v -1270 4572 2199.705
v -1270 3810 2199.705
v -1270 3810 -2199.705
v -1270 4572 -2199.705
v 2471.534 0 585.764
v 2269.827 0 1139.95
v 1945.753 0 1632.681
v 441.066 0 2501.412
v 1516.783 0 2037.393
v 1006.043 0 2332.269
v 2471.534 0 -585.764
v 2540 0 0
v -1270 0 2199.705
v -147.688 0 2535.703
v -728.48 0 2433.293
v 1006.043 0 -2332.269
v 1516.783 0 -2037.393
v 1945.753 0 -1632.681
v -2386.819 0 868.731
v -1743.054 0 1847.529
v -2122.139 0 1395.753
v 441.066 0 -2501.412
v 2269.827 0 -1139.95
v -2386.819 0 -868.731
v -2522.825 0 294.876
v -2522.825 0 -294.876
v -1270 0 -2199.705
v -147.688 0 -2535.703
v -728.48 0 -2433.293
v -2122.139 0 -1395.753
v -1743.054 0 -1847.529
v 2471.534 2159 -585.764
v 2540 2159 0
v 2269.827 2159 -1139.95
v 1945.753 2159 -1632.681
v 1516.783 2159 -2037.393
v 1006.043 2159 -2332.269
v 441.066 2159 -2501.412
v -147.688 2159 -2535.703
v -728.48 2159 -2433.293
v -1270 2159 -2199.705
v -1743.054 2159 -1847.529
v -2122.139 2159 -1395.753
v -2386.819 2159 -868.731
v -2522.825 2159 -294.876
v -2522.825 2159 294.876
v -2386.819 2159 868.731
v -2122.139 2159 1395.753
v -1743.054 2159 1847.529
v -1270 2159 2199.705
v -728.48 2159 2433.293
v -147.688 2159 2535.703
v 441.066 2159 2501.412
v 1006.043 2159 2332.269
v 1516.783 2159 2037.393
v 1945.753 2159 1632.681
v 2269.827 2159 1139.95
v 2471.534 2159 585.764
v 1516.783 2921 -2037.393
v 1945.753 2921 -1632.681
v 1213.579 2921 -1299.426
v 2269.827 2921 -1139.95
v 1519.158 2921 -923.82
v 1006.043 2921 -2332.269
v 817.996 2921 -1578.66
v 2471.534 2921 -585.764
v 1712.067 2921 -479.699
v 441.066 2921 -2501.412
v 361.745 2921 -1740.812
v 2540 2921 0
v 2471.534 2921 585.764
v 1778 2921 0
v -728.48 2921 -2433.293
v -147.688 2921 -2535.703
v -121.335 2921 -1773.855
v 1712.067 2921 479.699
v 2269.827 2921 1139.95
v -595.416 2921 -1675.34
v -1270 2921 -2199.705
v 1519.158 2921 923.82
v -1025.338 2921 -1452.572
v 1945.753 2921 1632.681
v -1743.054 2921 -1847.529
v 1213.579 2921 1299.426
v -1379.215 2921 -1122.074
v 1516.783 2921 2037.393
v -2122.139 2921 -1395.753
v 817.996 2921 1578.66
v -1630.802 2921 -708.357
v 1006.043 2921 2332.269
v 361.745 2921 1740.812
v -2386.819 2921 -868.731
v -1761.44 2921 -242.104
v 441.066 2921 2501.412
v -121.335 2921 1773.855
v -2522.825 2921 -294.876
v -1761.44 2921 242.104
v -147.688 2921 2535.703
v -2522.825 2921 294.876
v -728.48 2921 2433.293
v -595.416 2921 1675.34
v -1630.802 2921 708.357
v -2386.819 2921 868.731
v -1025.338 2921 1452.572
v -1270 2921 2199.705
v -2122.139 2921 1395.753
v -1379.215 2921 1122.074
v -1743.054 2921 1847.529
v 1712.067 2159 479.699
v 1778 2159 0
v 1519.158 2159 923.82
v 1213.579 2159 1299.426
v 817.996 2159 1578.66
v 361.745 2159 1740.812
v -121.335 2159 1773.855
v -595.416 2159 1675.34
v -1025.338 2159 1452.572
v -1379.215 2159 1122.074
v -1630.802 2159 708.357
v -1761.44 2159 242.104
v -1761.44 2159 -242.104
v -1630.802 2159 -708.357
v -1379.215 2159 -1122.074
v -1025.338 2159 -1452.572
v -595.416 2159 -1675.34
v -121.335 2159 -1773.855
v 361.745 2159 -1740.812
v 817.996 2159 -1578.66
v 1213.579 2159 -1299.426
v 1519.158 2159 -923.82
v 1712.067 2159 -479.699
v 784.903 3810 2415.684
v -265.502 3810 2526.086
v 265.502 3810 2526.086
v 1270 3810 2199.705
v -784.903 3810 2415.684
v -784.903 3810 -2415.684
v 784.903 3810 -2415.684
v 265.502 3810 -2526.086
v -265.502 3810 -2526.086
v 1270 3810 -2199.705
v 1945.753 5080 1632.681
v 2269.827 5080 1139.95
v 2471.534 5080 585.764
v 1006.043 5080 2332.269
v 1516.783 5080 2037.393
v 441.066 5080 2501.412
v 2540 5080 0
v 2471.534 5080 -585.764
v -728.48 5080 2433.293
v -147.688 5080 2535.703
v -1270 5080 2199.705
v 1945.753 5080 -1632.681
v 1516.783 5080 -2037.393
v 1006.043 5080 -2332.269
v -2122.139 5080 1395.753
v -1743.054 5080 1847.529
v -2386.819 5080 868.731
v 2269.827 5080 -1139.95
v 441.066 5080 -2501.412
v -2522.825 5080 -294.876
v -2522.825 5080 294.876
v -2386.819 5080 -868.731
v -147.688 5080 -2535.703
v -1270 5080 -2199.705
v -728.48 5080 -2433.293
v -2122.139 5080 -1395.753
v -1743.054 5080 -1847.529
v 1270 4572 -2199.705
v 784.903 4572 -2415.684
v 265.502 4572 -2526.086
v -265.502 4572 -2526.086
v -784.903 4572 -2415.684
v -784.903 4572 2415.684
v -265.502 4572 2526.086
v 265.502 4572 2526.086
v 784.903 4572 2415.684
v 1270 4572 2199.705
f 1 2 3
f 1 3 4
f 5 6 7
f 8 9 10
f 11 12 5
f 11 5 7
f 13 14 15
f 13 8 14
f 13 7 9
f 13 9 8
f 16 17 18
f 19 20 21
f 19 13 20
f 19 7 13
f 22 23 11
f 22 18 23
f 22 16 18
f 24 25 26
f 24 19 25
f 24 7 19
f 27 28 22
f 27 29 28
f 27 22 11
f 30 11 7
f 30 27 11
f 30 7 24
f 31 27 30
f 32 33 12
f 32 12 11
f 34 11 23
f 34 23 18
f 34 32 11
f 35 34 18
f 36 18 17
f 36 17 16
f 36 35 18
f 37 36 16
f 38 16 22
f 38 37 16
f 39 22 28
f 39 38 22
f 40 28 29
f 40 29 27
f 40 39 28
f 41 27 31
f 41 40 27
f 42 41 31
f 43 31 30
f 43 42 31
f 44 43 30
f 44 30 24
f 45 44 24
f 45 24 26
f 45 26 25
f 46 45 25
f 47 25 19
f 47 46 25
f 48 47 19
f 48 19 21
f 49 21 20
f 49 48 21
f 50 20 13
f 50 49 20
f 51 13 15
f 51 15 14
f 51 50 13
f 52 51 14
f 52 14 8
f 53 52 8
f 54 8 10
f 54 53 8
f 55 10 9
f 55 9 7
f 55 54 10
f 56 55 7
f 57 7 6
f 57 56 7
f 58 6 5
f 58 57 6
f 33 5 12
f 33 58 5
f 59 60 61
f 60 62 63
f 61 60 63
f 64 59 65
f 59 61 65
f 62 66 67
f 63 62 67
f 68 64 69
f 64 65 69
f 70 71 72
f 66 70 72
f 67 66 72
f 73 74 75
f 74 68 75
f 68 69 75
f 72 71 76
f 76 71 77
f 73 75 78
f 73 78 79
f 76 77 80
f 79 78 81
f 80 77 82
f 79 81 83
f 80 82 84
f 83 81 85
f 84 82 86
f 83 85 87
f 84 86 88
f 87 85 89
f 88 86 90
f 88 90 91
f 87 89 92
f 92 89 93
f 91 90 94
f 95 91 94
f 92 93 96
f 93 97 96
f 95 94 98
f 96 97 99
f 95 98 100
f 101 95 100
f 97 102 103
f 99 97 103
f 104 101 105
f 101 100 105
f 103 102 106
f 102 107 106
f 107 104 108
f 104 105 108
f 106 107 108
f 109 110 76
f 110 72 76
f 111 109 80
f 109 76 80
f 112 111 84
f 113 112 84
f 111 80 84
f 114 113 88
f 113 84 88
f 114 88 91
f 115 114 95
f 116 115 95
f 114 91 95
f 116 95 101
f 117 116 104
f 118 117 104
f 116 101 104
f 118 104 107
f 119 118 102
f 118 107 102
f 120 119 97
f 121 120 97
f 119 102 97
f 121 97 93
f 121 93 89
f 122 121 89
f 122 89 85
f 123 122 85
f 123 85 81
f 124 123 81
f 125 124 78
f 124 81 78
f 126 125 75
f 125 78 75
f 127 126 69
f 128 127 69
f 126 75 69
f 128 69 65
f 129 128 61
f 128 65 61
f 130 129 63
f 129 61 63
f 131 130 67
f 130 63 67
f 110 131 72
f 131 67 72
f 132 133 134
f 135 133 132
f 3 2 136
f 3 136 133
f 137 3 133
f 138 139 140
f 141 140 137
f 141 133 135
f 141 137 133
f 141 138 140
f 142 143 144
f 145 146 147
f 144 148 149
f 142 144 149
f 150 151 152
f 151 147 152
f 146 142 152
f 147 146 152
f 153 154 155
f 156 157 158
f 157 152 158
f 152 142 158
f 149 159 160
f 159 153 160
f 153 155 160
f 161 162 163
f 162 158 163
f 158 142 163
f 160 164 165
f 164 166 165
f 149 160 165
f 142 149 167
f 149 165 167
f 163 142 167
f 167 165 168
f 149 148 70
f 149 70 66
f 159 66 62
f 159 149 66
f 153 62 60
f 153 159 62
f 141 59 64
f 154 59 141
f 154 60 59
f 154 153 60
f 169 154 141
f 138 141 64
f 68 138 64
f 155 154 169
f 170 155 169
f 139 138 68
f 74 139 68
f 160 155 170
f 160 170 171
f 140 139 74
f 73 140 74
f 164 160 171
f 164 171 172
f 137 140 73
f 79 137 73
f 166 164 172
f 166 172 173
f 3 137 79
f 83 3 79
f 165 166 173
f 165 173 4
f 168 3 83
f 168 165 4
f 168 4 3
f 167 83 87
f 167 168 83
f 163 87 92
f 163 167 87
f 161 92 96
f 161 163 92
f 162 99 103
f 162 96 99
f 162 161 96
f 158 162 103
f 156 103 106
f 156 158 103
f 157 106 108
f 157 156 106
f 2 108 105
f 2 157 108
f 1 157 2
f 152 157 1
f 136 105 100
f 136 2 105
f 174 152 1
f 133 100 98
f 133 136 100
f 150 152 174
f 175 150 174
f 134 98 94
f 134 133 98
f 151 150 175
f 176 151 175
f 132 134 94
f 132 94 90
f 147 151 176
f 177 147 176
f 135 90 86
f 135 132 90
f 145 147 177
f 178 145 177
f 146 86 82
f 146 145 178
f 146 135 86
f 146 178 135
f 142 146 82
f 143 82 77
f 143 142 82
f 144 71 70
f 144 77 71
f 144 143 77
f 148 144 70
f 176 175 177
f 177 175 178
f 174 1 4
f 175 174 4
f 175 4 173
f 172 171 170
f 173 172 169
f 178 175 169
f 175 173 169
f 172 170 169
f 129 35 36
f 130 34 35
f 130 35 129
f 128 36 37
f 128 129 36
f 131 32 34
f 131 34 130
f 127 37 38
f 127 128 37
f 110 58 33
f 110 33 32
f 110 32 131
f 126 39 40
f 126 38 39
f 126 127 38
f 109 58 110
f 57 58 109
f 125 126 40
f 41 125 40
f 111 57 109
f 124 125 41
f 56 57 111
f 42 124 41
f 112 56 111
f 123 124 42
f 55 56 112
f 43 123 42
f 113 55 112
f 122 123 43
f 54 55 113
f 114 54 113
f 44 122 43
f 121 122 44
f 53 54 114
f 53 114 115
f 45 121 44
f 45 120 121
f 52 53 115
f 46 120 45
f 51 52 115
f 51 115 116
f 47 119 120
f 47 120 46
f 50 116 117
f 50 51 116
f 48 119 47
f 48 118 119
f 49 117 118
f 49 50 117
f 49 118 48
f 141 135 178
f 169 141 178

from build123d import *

# Parameters (mm, degrees)
SKETCH1_W               = 2540
SKETCH1_H               = 5080
SKETCH2_W               = 762
SKETCH2_H               = 762
CUT_EXTRUDE1_DEPTH      = 6222.703946669
CUT_EXTRUDE1_DEPTH_BACK = 6222.703946669
SKETCH3_W               = 2540
SKETCH3_H               = 762


with BuildPart() as part:
    # Sketch1 → Revolve1 (revolve)
    with BuildSketch(Plane.XY):
        with Locations((1270, 2540)):
            Rectangle(SKETCH1_W, SKETCH1_H)
    revolve(axis=Axis((0, 0, 0), (0, 1, 0)))

    # Sketch2 → Cut-Revolve1 (revolve, cut)
    with BuildSketch(Plane.XY):
        with Locations((2159, 2540)):
            Rectangle(SKETCH2_W, SKETCH2_H)
    revolve(axis=Axis((0, 5080, 0), (0, -1, 0)), mode=Mode.SUBTRACT)

    # Sketch3 → Cut-Extrude1 (cut, two sides: drawn at the far end of the back side and taken through both)
    with BuildSketch(Plane.XY.offset(-CUT_EXTRUDE1_DEPTH_BACK)):
        with Locations((0, 4191)):
            Rectangle(SKETCH3_W, SKETCH3_H)
    extrude(amount=CUT_EXTRUDE1_DEPTH + CUT_EXTRUDE1_DEPTH_BACK, mode=Mode.SUBTRACT)


solid = part.part
